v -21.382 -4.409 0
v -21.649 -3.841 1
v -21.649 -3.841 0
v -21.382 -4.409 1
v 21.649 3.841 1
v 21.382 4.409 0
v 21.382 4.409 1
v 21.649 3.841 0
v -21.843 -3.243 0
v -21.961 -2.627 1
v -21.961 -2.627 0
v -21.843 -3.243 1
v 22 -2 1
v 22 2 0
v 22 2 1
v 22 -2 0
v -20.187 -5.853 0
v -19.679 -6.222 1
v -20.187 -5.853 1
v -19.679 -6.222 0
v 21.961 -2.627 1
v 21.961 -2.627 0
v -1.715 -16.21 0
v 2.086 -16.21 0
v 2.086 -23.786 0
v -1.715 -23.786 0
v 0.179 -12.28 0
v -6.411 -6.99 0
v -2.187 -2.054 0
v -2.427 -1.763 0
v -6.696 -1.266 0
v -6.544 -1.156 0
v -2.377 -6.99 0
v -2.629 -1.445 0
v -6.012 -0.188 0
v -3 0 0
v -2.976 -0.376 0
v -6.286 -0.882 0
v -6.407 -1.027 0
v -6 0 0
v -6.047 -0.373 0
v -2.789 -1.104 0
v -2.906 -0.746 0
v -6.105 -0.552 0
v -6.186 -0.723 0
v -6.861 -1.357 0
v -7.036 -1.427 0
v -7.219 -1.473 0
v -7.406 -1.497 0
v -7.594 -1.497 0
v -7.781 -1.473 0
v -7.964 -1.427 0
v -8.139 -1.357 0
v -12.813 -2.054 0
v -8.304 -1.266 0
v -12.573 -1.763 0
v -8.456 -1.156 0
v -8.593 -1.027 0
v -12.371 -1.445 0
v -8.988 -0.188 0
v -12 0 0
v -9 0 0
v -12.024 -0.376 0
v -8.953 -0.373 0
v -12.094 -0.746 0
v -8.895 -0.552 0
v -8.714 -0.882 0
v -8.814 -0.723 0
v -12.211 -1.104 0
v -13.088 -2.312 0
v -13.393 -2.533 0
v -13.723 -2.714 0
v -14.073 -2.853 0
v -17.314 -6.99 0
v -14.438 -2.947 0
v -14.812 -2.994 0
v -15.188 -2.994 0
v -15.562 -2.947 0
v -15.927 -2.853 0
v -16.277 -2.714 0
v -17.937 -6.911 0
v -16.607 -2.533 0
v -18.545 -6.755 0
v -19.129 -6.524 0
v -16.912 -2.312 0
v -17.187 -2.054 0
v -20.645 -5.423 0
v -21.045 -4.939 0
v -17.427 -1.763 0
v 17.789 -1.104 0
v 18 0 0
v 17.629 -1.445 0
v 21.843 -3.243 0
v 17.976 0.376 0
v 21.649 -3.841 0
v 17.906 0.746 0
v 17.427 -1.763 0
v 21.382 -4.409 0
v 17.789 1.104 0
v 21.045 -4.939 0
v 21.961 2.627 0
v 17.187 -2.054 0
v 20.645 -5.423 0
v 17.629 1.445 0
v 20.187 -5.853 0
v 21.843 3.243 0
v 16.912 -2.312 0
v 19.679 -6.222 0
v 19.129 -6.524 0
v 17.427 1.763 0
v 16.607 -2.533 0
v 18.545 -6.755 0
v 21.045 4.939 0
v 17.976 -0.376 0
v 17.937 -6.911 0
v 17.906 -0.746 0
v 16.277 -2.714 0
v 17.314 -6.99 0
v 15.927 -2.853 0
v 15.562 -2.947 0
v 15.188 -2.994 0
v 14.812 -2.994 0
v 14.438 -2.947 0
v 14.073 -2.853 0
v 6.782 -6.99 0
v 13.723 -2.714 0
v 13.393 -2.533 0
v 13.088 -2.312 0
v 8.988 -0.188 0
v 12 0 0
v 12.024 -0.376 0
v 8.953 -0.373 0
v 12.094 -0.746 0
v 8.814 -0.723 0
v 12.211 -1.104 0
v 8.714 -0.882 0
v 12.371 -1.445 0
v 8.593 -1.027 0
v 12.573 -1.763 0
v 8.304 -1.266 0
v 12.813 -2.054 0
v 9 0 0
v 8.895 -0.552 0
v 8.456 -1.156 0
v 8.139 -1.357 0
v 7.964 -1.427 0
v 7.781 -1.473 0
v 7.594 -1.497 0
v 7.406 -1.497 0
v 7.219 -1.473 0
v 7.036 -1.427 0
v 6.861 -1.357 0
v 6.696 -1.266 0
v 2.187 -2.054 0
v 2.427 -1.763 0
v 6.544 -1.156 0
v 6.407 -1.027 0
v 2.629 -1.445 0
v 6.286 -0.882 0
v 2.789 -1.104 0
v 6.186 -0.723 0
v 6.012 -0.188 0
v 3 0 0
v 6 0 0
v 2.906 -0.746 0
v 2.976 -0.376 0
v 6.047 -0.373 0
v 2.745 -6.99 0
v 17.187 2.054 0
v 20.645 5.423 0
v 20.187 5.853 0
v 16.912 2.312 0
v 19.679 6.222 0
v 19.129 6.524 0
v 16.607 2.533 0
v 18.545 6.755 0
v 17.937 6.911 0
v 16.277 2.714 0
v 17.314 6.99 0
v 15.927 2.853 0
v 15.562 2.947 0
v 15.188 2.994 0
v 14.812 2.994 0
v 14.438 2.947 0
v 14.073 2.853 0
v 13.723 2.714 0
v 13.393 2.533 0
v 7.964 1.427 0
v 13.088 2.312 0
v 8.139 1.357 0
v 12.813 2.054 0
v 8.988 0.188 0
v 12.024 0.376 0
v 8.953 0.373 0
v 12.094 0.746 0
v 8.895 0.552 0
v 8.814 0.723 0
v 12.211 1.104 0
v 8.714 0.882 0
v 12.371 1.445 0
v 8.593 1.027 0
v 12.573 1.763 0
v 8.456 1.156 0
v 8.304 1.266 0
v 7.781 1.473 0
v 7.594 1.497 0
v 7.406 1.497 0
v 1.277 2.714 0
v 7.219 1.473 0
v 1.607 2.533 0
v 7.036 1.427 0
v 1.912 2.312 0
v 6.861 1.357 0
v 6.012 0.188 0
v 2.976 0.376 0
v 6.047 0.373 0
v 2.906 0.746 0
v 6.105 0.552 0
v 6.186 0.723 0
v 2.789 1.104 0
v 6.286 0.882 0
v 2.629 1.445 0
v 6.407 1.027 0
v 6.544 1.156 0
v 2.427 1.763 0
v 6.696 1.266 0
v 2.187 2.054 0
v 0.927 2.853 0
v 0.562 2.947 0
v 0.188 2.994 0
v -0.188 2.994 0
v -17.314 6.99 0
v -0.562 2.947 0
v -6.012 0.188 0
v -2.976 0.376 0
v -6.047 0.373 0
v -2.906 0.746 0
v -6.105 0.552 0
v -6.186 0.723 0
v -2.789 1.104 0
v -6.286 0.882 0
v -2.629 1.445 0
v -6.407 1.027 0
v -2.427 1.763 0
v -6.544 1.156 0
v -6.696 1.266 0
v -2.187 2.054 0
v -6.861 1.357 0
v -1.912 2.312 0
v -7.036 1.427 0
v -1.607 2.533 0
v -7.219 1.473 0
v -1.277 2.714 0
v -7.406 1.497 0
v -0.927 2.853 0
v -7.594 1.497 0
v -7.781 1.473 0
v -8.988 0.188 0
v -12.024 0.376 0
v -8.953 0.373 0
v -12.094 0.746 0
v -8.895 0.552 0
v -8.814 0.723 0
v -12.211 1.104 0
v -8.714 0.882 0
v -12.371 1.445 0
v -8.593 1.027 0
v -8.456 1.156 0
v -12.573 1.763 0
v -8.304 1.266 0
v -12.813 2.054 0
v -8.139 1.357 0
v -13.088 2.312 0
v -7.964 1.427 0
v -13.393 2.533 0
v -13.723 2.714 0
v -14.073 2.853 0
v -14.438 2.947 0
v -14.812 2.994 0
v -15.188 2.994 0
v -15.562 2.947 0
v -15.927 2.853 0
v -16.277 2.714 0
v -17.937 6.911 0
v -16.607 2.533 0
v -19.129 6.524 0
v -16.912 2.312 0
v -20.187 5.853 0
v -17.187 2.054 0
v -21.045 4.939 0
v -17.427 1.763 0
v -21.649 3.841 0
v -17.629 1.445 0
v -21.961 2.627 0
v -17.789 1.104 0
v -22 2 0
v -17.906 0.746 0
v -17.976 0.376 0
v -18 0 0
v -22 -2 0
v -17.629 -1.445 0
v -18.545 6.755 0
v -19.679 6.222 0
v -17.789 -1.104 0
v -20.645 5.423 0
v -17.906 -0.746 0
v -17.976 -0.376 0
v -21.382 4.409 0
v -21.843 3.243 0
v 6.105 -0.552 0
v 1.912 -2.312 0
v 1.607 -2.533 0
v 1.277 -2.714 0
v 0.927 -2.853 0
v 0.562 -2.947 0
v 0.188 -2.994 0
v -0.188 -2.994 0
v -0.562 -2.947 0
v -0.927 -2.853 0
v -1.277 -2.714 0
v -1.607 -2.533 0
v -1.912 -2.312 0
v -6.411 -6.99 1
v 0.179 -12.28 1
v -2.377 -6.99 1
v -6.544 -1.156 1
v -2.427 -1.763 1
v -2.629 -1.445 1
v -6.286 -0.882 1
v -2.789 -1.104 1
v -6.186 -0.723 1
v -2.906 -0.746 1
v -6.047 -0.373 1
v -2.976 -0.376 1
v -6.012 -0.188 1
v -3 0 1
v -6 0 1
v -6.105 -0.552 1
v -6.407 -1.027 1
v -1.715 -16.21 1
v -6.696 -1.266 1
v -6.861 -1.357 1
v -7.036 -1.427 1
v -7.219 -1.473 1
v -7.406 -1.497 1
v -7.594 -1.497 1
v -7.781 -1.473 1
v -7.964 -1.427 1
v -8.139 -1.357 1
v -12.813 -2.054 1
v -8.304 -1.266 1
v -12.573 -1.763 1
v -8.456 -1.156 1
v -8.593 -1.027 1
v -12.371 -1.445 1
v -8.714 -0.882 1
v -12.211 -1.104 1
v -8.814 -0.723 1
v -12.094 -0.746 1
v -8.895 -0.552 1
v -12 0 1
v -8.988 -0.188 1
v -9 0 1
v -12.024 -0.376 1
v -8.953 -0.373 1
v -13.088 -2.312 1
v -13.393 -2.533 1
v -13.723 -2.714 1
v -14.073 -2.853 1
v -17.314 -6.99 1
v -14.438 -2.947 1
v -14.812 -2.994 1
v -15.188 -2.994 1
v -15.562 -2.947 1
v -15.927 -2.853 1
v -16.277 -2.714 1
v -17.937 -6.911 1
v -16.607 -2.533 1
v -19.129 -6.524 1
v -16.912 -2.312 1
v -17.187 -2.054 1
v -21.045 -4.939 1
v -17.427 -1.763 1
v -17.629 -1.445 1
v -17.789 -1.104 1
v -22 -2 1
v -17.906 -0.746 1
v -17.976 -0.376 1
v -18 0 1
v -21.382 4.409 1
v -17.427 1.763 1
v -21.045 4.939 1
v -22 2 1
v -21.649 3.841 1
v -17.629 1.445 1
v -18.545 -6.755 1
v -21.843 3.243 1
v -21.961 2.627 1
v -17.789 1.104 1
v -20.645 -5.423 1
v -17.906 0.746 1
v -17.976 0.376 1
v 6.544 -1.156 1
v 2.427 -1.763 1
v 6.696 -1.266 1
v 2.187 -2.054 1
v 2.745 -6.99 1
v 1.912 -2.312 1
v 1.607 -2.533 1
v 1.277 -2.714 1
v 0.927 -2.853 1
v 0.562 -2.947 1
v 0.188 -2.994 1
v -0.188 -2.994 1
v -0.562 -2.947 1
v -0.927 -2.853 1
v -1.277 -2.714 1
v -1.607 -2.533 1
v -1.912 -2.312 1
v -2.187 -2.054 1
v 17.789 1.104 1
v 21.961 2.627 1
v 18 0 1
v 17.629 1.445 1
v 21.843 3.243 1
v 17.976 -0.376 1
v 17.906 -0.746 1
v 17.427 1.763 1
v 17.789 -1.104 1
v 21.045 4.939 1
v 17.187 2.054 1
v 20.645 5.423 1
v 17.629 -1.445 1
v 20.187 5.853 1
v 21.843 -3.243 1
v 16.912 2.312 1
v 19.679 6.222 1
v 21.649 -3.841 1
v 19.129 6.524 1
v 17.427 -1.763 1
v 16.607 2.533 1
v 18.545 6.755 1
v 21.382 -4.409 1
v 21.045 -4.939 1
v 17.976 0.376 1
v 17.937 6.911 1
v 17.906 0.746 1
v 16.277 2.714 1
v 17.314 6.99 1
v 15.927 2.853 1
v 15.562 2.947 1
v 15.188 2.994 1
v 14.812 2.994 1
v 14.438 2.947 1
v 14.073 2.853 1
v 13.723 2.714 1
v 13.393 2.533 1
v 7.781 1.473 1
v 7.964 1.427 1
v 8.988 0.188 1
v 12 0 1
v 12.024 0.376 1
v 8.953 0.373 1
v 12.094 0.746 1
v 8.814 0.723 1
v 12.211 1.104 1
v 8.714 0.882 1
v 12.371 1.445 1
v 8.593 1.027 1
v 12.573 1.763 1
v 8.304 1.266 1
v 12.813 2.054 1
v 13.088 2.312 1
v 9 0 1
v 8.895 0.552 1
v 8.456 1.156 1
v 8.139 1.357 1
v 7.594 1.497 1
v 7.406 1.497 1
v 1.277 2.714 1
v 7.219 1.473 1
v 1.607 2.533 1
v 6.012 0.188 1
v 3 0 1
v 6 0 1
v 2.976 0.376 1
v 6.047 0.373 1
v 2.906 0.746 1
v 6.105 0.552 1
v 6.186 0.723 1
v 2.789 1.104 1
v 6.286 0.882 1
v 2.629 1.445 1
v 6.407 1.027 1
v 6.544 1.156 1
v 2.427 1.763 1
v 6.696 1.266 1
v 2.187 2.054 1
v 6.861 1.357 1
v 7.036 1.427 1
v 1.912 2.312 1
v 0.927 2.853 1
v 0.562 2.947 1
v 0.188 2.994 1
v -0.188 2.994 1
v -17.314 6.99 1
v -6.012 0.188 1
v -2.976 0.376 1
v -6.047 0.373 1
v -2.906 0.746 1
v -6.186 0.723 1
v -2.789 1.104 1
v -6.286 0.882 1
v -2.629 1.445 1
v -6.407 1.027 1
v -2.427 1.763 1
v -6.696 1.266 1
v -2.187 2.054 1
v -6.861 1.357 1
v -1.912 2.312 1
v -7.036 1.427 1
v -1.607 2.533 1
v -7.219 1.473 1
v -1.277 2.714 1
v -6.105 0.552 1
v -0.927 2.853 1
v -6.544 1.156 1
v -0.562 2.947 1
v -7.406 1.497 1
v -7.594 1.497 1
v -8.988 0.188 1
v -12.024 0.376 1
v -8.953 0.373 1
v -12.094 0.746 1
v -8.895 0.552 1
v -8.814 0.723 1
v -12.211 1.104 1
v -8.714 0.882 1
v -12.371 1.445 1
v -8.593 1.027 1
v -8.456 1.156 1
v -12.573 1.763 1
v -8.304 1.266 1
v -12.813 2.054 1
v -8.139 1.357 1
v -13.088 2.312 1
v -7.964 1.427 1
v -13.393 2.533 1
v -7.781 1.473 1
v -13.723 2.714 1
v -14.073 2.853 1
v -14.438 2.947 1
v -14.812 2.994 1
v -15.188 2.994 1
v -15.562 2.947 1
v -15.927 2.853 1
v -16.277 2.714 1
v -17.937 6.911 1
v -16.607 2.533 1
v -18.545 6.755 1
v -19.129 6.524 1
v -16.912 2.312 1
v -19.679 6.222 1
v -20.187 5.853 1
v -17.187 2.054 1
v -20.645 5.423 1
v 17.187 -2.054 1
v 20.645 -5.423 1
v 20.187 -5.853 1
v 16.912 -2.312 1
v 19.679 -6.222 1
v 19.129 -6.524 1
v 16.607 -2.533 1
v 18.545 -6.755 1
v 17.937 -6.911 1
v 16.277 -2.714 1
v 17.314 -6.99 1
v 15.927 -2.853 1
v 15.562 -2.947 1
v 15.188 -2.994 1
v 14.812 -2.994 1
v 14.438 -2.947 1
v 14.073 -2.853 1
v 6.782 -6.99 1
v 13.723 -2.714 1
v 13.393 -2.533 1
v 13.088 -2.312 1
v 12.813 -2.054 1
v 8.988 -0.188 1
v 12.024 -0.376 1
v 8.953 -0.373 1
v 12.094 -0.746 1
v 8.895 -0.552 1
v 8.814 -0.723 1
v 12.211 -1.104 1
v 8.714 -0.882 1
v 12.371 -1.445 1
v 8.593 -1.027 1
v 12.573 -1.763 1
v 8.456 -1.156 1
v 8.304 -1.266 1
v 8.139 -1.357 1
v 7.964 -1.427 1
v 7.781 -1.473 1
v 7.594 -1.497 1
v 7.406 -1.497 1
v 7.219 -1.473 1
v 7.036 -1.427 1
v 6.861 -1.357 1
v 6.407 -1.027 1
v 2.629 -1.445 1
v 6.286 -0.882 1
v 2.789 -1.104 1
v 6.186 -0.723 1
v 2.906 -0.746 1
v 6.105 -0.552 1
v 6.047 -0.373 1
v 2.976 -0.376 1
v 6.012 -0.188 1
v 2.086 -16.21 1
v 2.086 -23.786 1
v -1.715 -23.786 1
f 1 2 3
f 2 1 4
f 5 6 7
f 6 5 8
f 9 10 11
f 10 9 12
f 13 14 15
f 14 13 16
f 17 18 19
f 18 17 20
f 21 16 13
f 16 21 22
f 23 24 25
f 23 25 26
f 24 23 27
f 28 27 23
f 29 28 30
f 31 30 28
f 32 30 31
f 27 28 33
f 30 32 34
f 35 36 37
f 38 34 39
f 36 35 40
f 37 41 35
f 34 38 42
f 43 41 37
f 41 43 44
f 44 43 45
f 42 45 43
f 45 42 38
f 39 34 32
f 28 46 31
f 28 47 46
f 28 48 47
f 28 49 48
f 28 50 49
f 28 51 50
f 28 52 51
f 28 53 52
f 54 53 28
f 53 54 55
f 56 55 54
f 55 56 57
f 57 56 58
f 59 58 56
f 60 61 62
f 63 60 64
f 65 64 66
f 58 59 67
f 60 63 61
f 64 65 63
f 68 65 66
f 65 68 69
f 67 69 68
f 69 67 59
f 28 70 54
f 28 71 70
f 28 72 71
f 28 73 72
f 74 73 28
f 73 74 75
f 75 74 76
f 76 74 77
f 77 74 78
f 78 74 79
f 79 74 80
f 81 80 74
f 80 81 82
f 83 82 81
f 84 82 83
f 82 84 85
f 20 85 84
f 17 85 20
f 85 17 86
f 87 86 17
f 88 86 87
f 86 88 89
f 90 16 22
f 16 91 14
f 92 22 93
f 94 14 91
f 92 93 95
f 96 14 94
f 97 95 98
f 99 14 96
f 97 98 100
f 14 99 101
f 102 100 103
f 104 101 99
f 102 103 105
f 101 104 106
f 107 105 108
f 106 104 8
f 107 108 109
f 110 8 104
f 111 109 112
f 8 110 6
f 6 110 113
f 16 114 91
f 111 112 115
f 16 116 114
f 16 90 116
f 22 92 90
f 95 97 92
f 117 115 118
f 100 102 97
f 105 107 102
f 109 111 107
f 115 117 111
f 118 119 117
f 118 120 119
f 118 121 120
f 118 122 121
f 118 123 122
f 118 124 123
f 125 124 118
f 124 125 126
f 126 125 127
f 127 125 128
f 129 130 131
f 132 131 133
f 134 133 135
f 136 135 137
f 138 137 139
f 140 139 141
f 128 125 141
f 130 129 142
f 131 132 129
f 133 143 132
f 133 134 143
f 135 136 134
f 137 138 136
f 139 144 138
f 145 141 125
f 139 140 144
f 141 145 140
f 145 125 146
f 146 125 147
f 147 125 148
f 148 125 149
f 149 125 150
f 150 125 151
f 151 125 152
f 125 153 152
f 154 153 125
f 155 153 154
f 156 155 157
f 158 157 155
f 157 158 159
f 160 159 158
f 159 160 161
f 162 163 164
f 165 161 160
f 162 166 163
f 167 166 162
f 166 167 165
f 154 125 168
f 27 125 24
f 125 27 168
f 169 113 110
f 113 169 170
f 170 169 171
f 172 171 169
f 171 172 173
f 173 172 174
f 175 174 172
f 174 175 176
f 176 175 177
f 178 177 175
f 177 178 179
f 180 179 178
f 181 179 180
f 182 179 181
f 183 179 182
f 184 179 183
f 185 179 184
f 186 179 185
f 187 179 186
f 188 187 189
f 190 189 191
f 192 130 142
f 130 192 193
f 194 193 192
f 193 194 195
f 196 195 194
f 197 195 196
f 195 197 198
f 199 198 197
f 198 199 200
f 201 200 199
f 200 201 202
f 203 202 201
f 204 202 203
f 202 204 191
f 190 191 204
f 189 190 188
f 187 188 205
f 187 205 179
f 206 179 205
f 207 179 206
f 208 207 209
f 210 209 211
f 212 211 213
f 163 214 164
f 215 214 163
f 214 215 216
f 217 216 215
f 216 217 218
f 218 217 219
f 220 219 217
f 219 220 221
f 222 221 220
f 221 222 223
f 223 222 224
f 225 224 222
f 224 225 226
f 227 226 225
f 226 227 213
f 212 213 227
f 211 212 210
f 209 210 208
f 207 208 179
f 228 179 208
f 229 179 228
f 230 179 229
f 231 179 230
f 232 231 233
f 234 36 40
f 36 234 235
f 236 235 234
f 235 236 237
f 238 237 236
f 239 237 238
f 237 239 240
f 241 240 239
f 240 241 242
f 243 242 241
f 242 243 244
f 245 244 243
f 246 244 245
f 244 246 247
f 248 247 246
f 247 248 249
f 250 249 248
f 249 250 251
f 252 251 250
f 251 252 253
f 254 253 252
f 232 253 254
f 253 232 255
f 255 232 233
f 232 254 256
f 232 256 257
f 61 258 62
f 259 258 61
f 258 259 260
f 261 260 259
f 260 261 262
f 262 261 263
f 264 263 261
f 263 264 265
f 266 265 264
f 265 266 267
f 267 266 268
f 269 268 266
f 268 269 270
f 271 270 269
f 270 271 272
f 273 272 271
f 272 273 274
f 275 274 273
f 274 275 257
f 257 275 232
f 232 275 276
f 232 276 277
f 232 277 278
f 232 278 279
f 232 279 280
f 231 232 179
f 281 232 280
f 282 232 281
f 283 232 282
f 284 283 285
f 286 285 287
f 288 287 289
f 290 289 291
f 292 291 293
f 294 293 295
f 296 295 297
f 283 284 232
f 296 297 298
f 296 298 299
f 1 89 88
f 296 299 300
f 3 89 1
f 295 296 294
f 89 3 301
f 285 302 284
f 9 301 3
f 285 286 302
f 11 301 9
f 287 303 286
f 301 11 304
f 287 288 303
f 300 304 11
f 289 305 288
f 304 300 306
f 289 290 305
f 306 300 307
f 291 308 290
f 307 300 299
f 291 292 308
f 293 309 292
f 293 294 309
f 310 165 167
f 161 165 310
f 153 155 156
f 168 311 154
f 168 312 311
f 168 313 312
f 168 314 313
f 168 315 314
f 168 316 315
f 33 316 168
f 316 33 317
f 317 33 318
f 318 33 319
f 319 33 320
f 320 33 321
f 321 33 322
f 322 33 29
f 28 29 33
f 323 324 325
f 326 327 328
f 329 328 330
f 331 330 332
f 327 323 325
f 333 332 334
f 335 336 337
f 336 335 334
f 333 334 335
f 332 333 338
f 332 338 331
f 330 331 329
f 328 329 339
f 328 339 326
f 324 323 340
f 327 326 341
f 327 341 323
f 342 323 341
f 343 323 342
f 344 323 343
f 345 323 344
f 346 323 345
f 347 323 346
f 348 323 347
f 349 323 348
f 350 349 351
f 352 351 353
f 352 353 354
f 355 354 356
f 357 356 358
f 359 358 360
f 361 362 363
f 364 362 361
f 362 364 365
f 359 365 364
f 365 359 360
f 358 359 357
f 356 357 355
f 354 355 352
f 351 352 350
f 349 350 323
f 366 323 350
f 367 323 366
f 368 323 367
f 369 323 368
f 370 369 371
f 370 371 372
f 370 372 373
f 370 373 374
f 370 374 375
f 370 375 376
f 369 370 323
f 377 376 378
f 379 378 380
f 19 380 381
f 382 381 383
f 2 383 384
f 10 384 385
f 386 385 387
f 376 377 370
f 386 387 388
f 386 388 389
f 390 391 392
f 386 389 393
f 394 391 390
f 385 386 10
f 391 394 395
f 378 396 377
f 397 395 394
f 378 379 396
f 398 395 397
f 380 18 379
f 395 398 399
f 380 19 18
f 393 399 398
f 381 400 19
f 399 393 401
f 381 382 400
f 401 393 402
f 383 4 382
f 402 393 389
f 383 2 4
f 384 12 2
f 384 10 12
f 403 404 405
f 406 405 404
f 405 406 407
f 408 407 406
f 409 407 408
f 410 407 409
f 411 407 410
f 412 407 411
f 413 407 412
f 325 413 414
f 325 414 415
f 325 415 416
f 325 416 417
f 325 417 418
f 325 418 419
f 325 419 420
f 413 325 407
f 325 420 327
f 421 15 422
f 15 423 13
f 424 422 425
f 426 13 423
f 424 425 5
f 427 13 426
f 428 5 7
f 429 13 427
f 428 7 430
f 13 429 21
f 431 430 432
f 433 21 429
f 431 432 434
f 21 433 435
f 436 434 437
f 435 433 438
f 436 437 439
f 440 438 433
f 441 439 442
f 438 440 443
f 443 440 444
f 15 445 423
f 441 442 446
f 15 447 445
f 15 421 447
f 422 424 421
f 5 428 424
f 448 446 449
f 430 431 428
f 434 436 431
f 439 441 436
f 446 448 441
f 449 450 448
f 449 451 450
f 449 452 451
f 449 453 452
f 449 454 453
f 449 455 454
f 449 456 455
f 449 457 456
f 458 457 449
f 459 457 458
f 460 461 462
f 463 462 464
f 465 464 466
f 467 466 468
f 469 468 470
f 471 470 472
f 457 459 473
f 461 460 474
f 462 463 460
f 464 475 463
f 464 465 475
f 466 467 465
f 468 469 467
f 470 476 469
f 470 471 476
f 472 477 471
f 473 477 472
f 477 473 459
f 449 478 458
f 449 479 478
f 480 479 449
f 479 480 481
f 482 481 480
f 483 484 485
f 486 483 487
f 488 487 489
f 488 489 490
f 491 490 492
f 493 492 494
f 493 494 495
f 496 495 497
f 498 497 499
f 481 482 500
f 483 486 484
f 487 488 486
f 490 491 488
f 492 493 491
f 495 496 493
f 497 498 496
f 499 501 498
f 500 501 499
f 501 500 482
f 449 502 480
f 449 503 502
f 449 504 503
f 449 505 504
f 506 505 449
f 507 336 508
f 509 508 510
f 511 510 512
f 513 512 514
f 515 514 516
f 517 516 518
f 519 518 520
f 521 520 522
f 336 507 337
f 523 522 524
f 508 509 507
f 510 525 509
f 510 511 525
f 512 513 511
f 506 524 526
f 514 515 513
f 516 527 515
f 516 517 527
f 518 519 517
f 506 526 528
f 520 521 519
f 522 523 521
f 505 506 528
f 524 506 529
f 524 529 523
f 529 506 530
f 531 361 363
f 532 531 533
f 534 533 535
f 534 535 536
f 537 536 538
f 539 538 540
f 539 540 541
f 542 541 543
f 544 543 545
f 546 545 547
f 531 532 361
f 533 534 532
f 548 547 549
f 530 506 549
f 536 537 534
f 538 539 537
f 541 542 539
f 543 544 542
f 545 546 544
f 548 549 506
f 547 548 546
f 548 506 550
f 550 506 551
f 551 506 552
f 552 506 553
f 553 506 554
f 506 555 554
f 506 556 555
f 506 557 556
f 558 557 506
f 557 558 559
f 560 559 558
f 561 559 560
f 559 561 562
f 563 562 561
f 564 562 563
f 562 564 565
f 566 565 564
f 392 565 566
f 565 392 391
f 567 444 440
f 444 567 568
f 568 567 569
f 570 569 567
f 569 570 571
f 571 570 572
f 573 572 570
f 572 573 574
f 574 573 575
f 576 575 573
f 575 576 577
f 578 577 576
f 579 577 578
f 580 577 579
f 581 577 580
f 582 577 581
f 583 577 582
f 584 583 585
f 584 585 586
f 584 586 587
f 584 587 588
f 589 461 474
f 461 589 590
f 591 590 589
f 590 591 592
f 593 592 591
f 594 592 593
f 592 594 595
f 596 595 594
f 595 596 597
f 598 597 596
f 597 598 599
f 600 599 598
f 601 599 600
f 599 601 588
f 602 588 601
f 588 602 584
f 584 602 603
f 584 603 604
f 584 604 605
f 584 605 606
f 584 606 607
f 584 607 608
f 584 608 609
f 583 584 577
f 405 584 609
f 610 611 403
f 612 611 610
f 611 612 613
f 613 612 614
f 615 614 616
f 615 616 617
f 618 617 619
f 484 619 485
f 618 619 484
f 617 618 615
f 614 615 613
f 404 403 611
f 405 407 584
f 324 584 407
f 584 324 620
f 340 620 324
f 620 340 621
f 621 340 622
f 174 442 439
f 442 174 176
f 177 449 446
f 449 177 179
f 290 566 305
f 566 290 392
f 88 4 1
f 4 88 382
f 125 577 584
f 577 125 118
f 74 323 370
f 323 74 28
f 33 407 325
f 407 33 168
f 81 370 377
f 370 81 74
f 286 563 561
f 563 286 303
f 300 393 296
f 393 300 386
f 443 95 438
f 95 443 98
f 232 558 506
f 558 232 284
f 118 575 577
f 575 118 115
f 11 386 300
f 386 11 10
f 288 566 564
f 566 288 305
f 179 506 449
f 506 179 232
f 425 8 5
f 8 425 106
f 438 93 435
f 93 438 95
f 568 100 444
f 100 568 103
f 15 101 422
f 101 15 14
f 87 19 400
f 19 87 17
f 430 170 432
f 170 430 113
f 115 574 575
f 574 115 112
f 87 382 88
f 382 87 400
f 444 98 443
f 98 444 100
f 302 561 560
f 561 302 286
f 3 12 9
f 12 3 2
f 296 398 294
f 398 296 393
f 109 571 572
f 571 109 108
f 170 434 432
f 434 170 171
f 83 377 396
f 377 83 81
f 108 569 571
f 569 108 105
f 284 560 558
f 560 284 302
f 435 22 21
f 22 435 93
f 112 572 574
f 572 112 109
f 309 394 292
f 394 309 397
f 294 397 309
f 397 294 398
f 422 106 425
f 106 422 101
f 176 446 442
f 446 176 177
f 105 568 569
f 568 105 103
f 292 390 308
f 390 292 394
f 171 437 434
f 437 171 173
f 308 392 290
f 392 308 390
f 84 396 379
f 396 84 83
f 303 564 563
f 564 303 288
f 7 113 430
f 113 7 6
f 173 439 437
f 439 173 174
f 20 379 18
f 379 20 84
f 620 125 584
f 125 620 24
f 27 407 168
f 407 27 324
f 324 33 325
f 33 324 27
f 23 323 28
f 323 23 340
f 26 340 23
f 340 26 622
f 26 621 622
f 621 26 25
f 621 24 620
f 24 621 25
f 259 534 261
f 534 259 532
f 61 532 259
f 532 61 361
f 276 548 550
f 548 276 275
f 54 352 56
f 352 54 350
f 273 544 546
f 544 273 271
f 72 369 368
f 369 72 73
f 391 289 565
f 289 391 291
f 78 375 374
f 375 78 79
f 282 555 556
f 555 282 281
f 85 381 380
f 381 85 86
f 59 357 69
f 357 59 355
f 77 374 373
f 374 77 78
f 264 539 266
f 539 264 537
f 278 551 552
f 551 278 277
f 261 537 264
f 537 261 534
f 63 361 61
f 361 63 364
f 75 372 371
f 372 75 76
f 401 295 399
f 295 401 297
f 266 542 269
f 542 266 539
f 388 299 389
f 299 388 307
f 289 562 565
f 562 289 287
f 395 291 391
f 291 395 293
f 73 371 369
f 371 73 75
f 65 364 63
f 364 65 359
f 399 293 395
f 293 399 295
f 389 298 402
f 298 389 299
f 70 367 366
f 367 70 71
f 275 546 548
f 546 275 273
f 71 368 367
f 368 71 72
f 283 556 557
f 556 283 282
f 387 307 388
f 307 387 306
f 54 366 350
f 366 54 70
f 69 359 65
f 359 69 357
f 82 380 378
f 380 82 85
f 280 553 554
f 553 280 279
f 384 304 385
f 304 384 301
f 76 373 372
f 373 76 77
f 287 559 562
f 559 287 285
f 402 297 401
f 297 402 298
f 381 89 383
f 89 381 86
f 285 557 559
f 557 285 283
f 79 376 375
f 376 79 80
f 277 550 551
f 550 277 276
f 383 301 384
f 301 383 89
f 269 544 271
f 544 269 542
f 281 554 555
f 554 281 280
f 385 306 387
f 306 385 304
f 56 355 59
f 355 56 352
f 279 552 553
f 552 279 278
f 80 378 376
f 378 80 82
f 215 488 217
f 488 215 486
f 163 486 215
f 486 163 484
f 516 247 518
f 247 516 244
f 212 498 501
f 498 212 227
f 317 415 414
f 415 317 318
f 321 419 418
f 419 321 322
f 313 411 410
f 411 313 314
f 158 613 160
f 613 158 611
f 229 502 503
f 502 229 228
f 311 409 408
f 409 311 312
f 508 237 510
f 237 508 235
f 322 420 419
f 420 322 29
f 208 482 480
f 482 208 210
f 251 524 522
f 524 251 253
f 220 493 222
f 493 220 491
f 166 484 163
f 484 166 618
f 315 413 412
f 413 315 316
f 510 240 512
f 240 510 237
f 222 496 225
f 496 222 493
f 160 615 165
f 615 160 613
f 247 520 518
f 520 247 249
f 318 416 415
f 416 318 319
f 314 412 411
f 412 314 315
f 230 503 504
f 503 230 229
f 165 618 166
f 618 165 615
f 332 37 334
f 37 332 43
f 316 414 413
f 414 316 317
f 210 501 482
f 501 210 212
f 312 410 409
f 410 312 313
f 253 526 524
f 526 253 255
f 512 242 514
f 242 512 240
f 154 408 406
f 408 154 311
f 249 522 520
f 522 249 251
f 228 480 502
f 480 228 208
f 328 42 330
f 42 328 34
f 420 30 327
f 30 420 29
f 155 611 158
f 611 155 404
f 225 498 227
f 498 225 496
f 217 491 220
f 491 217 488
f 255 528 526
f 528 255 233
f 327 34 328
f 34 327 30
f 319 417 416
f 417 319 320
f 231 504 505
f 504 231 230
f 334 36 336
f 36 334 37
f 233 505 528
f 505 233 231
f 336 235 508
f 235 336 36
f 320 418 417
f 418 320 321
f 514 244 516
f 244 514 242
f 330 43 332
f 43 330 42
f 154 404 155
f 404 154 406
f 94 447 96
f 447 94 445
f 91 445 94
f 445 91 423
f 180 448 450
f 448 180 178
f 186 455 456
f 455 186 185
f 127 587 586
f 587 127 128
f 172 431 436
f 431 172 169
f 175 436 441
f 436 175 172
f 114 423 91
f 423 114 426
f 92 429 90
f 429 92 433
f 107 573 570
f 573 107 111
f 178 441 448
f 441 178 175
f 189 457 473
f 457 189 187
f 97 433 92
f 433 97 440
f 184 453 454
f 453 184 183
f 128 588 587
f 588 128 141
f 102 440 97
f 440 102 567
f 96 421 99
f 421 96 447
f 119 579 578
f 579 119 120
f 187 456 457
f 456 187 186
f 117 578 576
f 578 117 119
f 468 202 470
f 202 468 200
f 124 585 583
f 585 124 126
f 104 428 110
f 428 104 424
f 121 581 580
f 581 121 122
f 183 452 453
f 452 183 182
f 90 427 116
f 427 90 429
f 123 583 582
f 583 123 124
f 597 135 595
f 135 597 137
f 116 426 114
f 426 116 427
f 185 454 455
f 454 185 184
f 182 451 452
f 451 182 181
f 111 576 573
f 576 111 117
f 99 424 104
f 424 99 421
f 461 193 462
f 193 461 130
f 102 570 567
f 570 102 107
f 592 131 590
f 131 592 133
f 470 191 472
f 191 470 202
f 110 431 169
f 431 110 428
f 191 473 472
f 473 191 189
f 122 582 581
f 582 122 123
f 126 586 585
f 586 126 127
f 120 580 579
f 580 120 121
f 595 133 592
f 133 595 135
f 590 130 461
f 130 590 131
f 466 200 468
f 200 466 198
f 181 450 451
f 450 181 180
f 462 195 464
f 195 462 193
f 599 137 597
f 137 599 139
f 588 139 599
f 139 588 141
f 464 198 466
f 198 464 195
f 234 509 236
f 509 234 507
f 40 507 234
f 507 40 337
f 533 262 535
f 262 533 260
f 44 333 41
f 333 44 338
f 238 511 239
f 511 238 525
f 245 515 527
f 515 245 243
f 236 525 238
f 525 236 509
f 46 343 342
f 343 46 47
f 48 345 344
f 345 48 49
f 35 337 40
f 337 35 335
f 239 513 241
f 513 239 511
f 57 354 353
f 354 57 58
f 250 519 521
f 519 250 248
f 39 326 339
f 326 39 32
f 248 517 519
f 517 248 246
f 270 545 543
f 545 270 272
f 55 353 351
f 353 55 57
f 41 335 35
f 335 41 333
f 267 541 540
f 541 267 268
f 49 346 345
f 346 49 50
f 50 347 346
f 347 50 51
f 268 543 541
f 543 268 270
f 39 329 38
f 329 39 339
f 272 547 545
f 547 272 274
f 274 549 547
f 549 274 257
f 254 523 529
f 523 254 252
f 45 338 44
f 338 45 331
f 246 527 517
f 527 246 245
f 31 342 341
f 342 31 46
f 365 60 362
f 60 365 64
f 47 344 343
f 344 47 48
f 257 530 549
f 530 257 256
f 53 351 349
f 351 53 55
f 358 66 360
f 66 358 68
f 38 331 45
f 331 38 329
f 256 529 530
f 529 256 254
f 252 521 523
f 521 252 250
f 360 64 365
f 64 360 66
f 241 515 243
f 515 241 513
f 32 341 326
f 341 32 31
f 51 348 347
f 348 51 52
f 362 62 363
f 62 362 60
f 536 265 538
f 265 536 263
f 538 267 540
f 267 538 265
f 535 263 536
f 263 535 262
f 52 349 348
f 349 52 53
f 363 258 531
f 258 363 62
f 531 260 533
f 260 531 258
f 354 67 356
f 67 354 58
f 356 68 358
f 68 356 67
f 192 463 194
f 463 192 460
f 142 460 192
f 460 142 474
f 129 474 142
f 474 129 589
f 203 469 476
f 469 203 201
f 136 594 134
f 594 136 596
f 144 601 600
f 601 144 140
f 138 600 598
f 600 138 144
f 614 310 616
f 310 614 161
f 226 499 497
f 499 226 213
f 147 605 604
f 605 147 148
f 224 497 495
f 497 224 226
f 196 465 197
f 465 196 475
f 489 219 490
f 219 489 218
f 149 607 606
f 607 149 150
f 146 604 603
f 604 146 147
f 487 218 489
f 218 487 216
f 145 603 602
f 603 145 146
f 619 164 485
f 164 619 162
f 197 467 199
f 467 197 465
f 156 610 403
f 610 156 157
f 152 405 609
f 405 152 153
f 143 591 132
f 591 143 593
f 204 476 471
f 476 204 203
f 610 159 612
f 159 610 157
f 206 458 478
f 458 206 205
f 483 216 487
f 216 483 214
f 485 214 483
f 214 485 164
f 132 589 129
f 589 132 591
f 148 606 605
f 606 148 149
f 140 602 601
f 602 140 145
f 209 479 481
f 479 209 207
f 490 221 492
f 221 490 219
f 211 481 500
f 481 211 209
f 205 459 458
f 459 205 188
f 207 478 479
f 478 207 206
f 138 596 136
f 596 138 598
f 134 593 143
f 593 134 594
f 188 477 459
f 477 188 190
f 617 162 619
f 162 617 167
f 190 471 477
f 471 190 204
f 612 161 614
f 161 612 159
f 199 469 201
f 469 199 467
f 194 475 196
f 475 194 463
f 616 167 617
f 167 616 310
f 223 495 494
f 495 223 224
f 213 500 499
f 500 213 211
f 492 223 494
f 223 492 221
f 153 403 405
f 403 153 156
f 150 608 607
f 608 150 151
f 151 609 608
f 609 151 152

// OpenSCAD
$fn = 50;


difference() {
	union() {
		*color(alpha = 1.0000000000, c = "gray") {
			translate(v = [0, 14, 0]) {
				linear_extrude(height = 1) {
					text(font = "Arial:style=Bold", halign = "center", size = 4.5000000000, text = "COMMENT description oobb_plate_shape_p_type_1_depth_3_width_1_thickness_y_extra_oobb_size", valign = "center");
				}
			}
		}
		hull() {
			translate(v = [-17.0000000000, 2.0000000000, 0]) {
				cylinder(h = 1, r = 5);
			}
			translate(v = [17.0000000000, 2.0000000000, 0]) {
				cylinder(h = 1, r = 5);
			}
			translate(v = [-17.0000000000, -2.0000000000, 0]) {
				cylinder(h = 1, r = 5);
			}
			translate(v = [17.0000000000, -2.0000000000, 0]) {
				cylinder(h = 1, r = 5);
			}
		}
		translate(v = [0, -5, 0]) {
			linear_extrude(height = 1) {
				text(font = "DejaVu Sans Mono:style=Bold", halign = "center", size = 19.0000000000, text = "Y", valign = "top");
			}
		}
	}
	union() {
		*color(alpha = 1.0000000000, c = "gray") {
			translate(v = [0, 14, 0]) {
				linear_extrude(height = 1) {
					text(font = "Arial:style=Bold", halign = "center", size = 4.5000000000, text = "COMMENT description oobb_holes_shape_n_type_3_width_1_thickness_y_extra_oobb_size_1_height_'all'_holes_true_both_holes", valign = "center");
				}
			}
		}
		translate(v = [-15.0000000000, 0.0000000000, 0]) {
			translate(v = [0, 0, -50]) {
				cylinder(h = 100, r = 3.0000000000);
			}
		}
		translate(v = [0, 0, -50]) {
			cylinder(h = 100, r = 3.0000000000);
		}
		translate(v = [15.0000000000, 0.0000000000, 0]) {
			translate(v = [0, 0, -50]) {
				cylinder(h = 100, r = 3.0000000000);
			}
		}
		translate(v = [-15.0000000000, 0.0000000000, 0]) {
			translate(v = [0, 0, -50]) {
				cylinder(h = 100, r = 1.5000000000);
			}
		}
		translate(v = [-7.5000000000, 0.0000000000, 0]) {
			translate(v = [0, 0, -50]) {
				cylinder(h = 100, r = 1.5000000000);
			}
		}
		translate(v = [0, 0, -50]) {
			cylinder(h = 100, r = 1.5000000000);
		}
		translate(v = [7.5000000000, 0.0000000000, 0]) {
			translate(v = [0, 0, -50]) {
				cylinder(h = 100, r = 1.5000000000);
			}
		}
		translate(v = [15.0000000000, 0.0000000000, 0]) {
			translate(v = [0, 0, -50]) {
				cylinder(h = 100, r = 1.5000000000);
			}
		}
	}
}
